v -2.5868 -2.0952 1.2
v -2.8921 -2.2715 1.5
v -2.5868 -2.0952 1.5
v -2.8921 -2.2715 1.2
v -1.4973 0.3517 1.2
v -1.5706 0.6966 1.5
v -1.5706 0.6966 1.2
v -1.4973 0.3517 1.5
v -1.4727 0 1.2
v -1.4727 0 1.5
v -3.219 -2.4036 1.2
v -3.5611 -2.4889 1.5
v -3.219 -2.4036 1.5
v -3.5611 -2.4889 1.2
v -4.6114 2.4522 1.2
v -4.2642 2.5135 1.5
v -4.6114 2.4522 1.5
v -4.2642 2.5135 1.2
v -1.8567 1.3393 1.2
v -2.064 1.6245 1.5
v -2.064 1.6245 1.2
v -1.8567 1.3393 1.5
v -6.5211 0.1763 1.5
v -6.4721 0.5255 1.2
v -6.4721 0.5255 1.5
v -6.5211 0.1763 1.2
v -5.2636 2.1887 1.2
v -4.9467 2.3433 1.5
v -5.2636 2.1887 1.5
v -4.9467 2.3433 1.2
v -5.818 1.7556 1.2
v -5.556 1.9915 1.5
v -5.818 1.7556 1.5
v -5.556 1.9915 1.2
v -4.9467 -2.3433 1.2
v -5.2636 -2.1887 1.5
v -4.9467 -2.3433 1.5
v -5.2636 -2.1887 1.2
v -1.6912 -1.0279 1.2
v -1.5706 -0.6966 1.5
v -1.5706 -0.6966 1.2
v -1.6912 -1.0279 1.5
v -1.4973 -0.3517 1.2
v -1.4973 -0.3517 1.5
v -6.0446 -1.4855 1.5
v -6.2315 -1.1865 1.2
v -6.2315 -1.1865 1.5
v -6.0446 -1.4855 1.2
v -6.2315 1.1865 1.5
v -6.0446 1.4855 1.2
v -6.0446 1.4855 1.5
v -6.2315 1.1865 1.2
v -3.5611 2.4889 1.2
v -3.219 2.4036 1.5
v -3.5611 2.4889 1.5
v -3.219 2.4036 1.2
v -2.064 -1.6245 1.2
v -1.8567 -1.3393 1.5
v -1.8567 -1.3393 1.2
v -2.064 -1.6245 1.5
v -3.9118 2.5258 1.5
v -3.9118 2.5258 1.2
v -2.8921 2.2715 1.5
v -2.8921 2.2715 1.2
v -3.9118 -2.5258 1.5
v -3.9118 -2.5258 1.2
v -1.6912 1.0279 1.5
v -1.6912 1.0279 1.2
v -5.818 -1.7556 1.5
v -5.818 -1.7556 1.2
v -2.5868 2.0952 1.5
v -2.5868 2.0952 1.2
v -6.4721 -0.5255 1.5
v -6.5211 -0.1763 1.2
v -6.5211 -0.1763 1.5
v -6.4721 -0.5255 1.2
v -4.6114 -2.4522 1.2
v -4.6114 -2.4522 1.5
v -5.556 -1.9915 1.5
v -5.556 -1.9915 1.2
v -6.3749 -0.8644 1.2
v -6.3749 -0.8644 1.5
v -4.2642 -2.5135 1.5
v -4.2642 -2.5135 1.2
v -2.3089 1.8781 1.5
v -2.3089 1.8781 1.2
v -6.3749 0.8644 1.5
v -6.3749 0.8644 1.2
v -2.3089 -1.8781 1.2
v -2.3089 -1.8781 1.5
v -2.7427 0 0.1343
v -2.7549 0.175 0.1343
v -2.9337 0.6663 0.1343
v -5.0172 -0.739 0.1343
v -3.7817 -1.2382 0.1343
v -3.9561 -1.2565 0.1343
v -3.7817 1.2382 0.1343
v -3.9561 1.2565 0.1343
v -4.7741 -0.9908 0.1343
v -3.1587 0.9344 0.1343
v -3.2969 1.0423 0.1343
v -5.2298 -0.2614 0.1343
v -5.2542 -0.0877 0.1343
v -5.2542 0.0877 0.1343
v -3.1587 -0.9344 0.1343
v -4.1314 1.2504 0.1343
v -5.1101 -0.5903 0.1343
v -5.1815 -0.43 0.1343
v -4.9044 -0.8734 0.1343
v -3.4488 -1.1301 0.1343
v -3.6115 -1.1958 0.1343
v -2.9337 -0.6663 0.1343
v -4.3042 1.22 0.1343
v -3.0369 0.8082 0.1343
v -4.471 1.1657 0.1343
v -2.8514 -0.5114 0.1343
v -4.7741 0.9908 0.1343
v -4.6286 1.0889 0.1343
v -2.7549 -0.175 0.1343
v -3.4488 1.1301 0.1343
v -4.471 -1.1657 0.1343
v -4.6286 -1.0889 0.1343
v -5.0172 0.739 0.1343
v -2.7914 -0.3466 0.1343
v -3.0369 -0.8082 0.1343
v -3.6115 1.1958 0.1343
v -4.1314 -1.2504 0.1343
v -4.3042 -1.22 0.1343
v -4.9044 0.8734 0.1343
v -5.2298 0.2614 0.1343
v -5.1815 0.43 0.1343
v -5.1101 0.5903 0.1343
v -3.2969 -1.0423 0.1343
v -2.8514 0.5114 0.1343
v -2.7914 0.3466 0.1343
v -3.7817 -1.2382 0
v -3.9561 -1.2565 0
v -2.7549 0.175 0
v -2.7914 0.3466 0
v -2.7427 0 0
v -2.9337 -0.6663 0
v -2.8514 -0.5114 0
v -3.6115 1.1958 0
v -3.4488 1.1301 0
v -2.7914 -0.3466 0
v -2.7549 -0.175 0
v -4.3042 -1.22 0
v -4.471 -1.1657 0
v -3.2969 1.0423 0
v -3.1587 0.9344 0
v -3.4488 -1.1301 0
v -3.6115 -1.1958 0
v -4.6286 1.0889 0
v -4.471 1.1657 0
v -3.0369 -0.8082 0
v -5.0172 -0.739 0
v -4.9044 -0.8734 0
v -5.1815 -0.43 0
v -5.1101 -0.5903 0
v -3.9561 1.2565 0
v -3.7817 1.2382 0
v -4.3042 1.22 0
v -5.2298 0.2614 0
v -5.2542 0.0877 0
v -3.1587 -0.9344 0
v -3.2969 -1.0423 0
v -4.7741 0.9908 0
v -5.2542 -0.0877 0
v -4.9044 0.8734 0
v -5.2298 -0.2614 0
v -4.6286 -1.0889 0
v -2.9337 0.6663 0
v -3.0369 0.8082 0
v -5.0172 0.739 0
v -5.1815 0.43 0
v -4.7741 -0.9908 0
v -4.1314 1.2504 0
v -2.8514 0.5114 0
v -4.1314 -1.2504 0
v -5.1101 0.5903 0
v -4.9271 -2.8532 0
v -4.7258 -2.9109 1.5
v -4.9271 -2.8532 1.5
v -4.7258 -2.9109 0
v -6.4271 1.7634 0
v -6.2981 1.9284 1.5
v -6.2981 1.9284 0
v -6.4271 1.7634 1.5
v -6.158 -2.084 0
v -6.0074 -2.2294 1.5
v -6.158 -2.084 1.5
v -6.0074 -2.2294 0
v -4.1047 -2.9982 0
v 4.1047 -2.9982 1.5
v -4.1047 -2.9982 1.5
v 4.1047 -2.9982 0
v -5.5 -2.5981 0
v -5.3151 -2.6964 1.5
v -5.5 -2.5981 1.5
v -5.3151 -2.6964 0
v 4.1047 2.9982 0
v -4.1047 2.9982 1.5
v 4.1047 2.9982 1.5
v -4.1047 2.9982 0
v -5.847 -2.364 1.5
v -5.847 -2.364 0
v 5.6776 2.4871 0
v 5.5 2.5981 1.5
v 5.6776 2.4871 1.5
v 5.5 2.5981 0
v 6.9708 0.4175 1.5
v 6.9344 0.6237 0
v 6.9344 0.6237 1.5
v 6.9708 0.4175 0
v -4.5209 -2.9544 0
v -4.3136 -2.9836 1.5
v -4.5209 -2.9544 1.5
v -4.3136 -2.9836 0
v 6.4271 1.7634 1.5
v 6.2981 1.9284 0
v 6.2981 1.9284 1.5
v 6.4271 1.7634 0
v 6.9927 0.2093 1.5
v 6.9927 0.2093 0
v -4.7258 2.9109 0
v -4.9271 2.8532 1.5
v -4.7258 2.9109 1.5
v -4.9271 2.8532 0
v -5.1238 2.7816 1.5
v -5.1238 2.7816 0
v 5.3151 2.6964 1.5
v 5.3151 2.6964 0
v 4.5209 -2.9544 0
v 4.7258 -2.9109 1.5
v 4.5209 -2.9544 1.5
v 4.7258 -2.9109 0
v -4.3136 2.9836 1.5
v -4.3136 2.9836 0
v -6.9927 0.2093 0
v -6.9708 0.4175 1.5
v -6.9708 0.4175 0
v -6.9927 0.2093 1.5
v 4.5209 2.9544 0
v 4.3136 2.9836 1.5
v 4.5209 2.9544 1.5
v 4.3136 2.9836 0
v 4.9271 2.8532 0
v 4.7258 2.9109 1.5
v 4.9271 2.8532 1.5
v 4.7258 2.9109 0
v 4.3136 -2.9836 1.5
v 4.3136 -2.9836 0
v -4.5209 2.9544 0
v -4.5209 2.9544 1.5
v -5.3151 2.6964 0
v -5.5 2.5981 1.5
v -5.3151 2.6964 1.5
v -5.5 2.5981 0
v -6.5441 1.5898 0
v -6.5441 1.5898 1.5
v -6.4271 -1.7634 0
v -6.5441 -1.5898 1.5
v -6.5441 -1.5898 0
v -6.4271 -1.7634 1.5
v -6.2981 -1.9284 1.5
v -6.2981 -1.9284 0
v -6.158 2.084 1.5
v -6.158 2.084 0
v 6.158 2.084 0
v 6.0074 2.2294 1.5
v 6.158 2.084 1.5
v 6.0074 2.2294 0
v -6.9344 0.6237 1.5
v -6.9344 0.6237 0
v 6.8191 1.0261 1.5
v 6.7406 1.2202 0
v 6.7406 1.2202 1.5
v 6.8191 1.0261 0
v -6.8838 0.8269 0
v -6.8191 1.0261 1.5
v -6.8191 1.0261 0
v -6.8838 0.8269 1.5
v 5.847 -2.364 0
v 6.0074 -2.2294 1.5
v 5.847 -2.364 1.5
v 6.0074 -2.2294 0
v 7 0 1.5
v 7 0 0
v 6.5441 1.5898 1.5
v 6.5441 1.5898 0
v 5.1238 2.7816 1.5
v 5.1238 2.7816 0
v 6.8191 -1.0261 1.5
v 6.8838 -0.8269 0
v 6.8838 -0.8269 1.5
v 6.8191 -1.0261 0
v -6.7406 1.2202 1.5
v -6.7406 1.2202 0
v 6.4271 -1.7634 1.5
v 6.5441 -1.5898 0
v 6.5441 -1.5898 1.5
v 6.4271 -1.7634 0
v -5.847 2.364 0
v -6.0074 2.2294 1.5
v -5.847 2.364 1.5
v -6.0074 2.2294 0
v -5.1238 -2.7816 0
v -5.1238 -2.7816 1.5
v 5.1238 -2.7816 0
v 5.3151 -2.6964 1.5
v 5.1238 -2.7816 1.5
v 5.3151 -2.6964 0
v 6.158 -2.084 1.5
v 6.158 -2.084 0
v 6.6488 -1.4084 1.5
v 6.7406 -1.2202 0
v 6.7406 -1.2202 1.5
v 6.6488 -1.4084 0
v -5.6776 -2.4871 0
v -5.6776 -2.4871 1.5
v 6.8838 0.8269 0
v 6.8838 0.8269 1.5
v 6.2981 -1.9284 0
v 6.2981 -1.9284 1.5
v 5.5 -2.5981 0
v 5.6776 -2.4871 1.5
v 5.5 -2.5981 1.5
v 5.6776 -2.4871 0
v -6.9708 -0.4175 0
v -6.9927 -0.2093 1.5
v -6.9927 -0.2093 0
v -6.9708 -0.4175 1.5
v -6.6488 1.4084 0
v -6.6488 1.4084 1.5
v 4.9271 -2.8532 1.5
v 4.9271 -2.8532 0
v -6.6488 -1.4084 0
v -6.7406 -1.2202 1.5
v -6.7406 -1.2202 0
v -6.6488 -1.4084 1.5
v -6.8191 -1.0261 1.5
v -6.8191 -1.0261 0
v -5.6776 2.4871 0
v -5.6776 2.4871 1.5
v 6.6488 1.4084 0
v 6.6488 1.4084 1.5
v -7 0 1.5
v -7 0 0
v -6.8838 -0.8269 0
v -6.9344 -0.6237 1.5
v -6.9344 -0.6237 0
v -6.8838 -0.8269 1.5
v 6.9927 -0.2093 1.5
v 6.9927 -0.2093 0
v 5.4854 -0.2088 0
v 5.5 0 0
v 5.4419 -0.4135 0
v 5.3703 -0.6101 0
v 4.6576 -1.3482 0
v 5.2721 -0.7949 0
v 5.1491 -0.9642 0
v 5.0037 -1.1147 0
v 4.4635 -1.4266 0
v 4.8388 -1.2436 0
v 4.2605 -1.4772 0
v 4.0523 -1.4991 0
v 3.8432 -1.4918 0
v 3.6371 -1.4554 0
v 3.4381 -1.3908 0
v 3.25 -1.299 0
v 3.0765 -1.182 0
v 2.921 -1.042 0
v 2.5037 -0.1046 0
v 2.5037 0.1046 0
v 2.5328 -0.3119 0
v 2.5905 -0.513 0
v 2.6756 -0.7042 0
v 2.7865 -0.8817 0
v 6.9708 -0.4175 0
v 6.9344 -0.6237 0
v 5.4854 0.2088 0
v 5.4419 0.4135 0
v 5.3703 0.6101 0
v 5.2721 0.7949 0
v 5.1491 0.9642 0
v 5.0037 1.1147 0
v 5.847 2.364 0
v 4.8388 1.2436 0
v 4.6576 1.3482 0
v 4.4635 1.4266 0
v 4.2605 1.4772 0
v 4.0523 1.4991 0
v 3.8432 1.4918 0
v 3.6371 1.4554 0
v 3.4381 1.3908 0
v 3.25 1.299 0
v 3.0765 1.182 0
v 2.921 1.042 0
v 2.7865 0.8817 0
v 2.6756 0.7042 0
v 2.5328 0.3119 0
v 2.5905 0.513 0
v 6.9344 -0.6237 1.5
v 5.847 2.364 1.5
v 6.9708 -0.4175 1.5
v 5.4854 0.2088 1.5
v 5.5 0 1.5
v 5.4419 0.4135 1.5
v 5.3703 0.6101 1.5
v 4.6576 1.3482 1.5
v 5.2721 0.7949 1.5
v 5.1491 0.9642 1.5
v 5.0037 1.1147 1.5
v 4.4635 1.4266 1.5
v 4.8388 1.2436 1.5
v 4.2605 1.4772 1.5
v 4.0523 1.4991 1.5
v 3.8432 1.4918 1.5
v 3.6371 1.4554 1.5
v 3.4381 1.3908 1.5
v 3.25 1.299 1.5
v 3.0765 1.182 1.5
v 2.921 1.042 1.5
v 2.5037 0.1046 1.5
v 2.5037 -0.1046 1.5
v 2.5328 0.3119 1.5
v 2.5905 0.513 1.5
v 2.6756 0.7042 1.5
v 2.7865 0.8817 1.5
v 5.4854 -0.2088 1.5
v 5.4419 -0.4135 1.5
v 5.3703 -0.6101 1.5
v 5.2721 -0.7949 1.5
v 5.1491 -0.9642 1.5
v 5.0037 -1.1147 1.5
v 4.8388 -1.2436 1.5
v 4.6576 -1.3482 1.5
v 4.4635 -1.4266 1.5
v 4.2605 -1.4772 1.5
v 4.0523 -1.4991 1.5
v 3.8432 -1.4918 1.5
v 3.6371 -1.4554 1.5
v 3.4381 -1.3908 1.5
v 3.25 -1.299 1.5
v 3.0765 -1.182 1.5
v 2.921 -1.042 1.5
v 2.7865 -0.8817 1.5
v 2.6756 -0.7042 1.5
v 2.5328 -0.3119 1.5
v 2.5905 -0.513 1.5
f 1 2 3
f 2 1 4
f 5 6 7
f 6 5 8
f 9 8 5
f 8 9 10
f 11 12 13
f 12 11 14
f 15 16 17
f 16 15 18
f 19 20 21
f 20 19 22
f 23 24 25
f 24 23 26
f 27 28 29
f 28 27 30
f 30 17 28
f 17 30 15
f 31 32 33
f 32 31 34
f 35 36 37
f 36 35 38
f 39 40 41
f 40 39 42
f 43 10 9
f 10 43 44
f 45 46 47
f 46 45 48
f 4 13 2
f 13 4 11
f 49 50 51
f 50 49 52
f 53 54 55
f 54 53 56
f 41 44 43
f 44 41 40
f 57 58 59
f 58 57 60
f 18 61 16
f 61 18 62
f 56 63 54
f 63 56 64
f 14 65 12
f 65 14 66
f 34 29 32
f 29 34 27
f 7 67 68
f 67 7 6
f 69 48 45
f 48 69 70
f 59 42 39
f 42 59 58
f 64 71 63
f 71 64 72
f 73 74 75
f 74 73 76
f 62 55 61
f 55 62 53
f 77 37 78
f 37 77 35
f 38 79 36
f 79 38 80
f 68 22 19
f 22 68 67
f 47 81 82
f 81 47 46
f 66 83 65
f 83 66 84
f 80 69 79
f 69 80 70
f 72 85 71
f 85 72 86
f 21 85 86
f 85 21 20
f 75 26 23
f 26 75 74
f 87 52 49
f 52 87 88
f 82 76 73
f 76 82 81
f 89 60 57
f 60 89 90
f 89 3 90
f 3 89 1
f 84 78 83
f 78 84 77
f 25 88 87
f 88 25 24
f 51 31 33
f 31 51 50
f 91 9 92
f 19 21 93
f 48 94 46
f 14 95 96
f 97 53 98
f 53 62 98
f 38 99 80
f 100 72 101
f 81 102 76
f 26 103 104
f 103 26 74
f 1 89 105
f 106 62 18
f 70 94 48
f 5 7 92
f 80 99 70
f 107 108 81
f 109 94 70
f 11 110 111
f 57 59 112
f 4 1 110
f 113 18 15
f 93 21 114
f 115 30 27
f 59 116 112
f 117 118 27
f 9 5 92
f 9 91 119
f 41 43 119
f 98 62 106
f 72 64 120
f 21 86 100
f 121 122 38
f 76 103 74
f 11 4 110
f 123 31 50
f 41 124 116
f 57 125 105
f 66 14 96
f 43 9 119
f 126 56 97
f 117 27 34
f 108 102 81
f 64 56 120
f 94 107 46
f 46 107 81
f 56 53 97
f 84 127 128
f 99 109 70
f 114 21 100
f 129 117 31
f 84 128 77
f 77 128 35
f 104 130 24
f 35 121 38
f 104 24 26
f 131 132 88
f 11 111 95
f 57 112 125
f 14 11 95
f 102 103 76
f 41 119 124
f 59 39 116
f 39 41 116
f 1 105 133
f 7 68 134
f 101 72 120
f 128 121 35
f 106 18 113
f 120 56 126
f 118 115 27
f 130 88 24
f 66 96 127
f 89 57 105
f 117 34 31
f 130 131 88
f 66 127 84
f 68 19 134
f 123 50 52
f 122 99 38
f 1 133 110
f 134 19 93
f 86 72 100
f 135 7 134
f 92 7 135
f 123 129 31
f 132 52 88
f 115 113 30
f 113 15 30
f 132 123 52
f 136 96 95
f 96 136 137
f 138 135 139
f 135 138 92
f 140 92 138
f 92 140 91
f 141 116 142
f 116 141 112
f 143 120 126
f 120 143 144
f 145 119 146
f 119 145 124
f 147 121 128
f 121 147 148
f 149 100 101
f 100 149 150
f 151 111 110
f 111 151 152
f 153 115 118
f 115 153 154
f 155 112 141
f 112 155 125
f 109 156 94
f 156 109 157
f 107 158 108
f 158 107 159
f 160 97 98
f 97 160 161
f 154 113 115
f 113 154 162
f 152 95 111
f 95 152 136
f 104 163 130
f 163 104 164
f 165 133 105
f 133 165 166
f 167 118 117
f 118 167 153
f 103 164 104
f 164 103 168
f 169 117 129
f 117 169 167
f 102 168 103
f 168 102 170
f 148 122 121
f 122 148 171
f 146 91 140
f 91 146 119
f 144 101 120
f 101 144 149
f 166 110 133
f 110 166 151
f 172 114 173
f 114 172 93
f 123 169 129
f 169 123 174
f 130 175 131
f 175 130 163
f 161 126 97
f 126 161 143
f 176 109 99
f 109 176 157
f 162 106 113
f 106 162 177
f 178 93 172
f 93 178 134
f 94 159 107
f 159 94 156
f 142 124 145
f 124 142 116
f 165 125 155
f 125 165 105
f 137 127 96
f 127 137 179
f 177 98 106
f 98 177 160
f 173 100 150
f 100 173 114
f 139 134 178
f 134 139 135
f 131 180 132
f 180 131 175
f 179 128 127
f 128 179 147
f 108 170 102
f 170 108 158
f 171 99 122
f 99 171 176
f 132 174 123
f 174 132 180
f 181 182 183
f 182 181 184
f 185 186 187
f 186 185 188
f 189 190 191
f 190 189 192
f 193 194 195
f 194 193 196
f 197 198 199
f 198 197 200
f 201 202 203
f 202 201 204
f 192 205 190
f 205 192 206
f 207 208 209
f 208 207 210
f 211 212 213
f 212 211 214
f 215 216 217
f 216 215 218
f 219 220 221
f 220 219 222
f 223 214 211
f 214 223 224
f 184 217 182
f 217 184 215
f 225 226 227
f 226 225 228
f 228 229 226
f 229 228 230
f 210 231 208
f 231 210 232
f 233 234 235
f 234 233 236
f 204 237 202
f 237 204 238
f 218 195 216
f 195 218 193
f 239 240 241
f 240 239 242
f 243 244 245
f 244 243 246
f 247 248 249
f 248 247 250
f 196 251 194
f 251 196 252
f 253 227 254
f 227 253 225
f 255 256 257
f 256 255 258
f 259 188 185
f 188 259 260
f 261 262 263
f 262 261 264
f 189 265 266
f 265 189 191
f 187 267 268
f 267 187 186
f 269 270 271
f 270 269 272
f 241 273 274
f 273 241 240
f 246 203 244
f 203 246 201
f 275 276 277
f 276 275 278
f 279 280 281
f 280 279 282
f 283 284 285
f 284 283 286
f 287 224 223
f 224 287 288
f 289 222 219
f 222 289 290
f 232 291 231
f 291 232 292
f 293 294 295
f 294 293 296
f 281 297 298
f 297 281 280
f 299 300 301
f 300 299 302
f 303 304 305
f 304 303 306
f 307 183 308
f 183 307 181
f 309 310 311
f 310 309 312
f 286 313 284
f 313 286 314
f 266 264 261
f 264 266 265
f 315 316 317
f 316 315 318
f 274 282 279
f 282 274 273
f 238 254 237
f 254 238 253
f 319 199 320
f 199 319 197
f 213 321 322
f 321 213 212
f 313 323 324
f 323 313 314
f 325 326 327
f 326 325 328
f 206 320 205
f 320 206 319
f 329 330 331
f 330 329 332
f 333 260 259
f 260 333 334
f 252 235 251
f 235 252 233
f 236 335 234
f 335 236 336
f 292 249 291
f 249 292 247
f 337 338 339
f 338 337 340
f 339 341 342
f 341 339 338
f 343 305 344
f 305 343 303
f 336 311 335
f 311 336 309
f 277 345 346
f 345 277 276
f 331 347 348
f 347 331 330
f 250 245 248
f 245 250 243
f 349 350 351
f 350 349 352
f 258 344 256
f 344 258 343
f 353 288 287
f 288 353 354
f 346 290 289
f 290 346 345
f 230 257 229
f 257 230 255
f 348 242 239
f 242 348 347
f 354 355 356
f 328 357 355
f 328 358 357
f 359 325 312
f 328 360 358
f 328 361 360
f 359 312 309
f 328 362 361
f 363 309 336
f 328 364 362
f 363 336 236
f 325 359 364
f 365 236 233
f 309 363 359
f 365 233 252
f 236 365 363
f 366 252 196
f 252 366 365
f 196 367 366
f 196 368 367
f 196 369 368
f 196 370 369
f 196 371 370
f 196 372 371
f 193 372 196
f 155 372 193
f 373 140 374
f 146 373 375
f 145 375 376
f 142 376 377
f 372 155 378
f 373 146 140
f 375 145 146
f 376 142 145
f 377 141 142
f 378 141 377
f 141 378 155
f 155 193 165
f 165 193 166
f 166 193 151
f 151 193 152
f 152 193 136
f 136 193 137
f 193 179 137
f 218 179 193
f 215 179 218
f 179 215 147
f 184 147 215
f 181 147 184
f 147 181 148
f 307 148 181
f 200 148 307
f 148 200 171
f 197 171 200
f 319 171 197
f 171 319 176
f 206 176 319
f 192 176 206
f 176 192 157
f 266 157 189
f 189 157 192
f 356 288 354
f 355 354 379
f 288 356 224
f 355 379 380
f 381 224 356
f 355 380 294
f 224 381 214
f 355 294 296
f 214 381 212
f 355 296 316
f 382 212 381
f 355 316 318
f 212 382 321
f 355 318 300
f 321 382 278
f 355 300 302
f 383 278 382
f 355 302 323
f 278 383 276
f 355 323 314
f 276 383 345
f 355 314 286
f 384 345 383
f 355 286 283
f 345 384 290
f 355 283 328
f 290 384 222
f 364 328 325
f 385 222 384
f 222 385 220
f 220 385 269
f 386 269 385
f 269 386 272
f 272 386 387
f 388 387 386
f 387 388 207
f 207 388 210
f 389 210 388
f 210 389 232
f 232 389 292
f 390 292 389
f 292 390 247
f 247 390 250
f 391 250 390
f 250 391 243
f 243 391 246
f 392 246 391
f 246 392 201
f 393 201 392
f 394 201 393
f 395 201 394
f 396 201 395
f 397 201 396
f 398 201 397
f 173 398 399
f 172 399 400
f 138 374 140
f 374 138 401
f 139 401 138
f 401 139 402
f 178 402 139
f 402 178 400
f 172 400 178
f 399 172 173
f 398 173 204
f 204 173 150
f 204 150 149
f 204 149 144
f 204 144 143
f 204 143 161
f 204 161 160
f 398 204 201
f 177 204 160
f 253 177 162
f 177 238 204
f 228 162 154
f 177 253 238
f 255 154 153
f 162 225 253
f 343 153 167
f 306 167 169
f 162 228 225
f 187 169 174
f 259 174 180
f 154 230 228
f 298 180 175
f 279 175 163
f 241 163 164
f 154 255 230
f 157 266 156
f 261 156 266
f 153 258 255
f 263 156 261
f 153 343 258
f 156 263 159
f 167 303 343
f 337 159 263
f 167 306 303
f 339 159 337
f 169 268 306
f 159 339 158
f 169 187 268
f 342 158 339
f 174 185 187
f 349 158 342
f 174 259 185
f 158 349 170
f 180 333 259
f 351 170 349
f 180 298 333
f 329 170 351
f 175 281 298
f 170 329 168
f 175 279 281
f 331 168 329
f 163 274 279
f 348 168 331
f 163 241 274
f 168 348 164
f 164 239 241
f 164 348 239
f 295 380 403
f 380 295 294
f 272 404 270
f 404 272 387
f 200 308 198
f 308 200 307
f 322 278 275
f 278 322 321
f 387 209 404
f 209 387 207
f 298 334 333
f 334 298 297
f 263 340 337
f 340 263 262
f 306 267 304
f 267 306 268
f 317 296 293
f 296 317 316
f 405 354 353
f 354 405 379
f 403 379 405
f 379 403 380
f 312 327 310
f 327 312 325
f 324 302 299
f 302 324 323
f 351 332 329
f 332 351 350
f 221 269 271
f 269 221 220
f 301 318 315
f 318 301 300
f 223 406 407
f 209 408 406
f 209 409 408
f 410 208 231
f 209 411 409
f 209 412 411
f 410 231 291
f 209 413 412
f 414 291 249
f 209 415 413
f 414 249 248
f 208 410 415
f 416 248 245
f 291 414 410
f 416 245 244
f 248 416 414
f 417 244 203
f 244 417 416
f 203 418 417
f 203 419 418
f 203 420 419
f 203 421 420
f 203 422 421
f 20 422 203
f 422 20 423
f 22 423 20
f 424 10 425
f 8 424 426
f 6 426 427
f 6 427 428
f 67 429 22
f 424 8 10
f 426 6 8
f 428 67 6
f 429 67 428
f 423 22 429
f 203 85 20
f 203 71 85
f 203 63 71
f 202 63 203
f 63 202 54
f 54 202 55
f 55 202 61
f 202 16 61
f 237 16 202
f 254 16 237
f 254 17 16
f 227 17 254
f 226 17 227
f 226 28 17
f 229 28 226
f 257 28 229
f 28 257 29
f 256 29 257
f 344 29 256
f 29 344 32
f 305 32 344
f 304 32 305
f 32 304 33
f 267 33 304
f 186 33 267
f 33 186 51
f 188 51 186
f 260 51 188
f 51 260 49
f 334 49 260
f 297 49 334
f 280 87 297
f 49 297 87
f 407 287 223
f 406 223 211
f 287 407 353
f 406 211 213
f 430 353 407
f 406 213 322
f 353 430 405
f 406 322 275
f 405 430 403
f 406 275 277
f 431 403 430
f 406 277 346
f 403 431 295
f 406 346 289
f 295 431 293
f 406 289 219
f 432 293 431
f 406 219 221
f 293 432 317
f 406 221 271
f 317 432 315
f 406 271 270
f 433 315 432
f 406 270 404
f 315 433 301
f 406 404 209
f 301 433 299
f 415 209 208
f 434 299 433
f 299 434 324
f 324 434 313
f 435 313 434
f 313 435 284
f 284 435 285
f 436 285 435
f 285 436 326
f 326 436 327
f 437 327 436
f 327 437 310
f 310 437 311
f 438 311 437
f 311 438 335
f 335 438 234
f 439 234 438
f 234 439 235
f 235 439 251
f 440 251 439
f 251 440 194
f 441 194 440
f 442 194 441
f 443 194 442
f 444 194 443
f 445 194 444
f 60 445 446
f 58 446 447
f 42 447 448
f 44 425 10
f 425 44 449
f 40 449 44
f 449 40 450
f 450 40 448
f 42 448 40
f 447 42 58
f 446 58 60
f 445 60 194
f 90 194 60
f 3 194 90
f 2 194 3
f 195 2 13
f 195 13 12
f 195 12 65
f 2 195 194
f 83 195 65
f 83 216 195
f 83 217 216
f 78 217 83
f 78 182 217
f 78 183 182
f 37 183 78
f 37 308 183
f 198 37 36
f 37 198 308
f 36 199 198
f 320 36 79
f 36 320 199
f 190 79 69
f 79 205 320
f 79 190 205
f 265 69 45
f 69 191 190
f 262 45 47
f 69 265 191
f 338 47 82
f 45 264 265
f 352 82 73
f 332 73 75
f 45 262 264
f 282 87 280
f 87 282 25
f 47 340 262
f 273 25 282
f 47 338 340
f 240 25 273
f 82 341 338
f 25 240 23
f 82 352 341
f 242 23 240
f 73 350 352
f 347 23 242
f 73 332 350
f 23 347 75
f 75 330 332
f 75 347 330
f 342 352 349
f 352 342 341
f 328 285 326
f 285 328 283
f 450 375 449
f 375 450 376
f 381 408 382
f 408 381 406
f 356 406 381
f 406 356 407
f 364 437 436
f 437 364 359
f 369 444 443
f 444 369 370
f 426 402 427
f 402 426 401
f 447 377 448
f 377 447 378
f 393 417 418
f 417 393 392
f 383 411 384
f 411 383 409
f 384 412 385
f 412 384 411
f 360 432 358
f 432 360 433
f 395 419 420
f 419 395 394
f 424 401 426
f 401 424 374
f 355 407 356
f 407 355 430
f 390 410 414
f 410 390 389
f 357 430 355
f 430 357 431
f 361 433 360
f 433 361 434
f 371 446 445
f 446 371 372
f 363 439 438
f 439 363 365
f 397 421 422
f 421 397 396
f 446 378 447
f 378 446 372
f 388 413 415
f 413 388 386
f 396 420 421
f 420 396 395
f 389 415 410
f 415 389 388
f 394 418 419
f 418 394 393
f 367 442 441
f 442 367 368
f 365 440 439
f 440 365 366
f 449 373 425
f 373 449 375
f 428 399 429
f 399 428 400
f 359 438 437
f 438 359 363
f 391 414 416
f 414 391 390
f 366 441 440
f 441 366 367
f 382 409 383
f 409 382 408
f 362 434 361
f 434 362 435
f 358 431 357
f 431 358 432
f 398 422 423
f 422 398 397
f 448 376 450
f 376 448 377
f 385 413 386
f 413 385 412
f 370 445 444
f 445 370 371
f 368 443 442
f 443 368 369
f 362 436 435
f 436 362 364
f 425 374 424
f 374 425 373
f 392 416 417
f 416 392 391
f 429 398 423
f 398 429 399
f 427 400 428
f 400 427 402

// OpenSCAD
// Small picture frame hook

// Copyright (C) 2020 Jeremy Bennett <www.jeremybennett.com>

// Contributor: Jeremy Bennett <jeremy.bennett@embecosm.com>

// This file is licensed under the Creative Commons Attribution-ShareAlike 3.0
// Unported License. To view a copy of this license, visit
// http://creativecommons.org/licenses/by-sa/3.0/ or send a letter to Creative
// Commons, PO Box 1866, Mountain View, CA 94042, USA.


EPS = 0.1;

// Dimensions of a 3/8" no 3 wood screw

HEAD_DIAM = 0.199 * 25.4;           // x
SHANK_DIAM = 0.099 * 25.4;          // y
HEAD_ANGLE = 100.0;                 // B - not used explicitly

// The countersink height is calculated as:
//
//      x - y
//    ----------
//    2 tan(B/2)

CS_HEIGHT = 1.065656532;
CS_RIM_HEIGHT = 0.3;

// Clip dimensions
HOOK_H = 1.5;
HOOK_L = 8.0;
HOOK_MAJOR_D = 6.0;
HOOK_MINOR_D = 6.0;

// The hole for hanging
HOLE_DIAM = 3.0;

// Hole for a countersink screw
module cs_hole() {
     translate(v = [0, 0, CS_HEIGHT])
	  cylinder(r = HEAD_DIAM / 2, h = CS_RIM_HEIGHT + EPS, center = false,
		   $fn = 45);
     cylinder(r1 = SHANK_DIAM / 2, r2 = HEAD_DIAM / 2, h = CS_HEIGHT,
	      center = false, $fn = 45);
     cylinder(r = SHANK_DIAM / 2, h = HOOK_H * 3, center = true, $fn = 45);
}

// plain clip
module clip() {
     hull() {
	  translate(v = [-HOOK_L / 2, 0, 0])
	       cylinder(r = HOOK_MAJOR_D / 2, h = HOOK_H, center = false,
			$fn = 90);
	  translate(v = [HOOK_L / 2, 0, 0])
	       cylinder(r = HOOK_MINOR_D / 2, h = HOOK_H, center = false,
			$fn = 90);
     }
}

difference() {
     clip();
     translate(v = [-HOOK_L / 2, 0, HOOK_H - CS_HEIGHT - CS_RIM_HEIGHT])
	  cs_hole();
     translate(v = [HOOK_L / 2, 0, HOOK_H - CS_HEIGHT - CS_RIM_HEIGHT])
	  cylinder(r = HOLE_DIAM / 2, h = HOOK_H * 3, center = true, $fn = 45);
}
